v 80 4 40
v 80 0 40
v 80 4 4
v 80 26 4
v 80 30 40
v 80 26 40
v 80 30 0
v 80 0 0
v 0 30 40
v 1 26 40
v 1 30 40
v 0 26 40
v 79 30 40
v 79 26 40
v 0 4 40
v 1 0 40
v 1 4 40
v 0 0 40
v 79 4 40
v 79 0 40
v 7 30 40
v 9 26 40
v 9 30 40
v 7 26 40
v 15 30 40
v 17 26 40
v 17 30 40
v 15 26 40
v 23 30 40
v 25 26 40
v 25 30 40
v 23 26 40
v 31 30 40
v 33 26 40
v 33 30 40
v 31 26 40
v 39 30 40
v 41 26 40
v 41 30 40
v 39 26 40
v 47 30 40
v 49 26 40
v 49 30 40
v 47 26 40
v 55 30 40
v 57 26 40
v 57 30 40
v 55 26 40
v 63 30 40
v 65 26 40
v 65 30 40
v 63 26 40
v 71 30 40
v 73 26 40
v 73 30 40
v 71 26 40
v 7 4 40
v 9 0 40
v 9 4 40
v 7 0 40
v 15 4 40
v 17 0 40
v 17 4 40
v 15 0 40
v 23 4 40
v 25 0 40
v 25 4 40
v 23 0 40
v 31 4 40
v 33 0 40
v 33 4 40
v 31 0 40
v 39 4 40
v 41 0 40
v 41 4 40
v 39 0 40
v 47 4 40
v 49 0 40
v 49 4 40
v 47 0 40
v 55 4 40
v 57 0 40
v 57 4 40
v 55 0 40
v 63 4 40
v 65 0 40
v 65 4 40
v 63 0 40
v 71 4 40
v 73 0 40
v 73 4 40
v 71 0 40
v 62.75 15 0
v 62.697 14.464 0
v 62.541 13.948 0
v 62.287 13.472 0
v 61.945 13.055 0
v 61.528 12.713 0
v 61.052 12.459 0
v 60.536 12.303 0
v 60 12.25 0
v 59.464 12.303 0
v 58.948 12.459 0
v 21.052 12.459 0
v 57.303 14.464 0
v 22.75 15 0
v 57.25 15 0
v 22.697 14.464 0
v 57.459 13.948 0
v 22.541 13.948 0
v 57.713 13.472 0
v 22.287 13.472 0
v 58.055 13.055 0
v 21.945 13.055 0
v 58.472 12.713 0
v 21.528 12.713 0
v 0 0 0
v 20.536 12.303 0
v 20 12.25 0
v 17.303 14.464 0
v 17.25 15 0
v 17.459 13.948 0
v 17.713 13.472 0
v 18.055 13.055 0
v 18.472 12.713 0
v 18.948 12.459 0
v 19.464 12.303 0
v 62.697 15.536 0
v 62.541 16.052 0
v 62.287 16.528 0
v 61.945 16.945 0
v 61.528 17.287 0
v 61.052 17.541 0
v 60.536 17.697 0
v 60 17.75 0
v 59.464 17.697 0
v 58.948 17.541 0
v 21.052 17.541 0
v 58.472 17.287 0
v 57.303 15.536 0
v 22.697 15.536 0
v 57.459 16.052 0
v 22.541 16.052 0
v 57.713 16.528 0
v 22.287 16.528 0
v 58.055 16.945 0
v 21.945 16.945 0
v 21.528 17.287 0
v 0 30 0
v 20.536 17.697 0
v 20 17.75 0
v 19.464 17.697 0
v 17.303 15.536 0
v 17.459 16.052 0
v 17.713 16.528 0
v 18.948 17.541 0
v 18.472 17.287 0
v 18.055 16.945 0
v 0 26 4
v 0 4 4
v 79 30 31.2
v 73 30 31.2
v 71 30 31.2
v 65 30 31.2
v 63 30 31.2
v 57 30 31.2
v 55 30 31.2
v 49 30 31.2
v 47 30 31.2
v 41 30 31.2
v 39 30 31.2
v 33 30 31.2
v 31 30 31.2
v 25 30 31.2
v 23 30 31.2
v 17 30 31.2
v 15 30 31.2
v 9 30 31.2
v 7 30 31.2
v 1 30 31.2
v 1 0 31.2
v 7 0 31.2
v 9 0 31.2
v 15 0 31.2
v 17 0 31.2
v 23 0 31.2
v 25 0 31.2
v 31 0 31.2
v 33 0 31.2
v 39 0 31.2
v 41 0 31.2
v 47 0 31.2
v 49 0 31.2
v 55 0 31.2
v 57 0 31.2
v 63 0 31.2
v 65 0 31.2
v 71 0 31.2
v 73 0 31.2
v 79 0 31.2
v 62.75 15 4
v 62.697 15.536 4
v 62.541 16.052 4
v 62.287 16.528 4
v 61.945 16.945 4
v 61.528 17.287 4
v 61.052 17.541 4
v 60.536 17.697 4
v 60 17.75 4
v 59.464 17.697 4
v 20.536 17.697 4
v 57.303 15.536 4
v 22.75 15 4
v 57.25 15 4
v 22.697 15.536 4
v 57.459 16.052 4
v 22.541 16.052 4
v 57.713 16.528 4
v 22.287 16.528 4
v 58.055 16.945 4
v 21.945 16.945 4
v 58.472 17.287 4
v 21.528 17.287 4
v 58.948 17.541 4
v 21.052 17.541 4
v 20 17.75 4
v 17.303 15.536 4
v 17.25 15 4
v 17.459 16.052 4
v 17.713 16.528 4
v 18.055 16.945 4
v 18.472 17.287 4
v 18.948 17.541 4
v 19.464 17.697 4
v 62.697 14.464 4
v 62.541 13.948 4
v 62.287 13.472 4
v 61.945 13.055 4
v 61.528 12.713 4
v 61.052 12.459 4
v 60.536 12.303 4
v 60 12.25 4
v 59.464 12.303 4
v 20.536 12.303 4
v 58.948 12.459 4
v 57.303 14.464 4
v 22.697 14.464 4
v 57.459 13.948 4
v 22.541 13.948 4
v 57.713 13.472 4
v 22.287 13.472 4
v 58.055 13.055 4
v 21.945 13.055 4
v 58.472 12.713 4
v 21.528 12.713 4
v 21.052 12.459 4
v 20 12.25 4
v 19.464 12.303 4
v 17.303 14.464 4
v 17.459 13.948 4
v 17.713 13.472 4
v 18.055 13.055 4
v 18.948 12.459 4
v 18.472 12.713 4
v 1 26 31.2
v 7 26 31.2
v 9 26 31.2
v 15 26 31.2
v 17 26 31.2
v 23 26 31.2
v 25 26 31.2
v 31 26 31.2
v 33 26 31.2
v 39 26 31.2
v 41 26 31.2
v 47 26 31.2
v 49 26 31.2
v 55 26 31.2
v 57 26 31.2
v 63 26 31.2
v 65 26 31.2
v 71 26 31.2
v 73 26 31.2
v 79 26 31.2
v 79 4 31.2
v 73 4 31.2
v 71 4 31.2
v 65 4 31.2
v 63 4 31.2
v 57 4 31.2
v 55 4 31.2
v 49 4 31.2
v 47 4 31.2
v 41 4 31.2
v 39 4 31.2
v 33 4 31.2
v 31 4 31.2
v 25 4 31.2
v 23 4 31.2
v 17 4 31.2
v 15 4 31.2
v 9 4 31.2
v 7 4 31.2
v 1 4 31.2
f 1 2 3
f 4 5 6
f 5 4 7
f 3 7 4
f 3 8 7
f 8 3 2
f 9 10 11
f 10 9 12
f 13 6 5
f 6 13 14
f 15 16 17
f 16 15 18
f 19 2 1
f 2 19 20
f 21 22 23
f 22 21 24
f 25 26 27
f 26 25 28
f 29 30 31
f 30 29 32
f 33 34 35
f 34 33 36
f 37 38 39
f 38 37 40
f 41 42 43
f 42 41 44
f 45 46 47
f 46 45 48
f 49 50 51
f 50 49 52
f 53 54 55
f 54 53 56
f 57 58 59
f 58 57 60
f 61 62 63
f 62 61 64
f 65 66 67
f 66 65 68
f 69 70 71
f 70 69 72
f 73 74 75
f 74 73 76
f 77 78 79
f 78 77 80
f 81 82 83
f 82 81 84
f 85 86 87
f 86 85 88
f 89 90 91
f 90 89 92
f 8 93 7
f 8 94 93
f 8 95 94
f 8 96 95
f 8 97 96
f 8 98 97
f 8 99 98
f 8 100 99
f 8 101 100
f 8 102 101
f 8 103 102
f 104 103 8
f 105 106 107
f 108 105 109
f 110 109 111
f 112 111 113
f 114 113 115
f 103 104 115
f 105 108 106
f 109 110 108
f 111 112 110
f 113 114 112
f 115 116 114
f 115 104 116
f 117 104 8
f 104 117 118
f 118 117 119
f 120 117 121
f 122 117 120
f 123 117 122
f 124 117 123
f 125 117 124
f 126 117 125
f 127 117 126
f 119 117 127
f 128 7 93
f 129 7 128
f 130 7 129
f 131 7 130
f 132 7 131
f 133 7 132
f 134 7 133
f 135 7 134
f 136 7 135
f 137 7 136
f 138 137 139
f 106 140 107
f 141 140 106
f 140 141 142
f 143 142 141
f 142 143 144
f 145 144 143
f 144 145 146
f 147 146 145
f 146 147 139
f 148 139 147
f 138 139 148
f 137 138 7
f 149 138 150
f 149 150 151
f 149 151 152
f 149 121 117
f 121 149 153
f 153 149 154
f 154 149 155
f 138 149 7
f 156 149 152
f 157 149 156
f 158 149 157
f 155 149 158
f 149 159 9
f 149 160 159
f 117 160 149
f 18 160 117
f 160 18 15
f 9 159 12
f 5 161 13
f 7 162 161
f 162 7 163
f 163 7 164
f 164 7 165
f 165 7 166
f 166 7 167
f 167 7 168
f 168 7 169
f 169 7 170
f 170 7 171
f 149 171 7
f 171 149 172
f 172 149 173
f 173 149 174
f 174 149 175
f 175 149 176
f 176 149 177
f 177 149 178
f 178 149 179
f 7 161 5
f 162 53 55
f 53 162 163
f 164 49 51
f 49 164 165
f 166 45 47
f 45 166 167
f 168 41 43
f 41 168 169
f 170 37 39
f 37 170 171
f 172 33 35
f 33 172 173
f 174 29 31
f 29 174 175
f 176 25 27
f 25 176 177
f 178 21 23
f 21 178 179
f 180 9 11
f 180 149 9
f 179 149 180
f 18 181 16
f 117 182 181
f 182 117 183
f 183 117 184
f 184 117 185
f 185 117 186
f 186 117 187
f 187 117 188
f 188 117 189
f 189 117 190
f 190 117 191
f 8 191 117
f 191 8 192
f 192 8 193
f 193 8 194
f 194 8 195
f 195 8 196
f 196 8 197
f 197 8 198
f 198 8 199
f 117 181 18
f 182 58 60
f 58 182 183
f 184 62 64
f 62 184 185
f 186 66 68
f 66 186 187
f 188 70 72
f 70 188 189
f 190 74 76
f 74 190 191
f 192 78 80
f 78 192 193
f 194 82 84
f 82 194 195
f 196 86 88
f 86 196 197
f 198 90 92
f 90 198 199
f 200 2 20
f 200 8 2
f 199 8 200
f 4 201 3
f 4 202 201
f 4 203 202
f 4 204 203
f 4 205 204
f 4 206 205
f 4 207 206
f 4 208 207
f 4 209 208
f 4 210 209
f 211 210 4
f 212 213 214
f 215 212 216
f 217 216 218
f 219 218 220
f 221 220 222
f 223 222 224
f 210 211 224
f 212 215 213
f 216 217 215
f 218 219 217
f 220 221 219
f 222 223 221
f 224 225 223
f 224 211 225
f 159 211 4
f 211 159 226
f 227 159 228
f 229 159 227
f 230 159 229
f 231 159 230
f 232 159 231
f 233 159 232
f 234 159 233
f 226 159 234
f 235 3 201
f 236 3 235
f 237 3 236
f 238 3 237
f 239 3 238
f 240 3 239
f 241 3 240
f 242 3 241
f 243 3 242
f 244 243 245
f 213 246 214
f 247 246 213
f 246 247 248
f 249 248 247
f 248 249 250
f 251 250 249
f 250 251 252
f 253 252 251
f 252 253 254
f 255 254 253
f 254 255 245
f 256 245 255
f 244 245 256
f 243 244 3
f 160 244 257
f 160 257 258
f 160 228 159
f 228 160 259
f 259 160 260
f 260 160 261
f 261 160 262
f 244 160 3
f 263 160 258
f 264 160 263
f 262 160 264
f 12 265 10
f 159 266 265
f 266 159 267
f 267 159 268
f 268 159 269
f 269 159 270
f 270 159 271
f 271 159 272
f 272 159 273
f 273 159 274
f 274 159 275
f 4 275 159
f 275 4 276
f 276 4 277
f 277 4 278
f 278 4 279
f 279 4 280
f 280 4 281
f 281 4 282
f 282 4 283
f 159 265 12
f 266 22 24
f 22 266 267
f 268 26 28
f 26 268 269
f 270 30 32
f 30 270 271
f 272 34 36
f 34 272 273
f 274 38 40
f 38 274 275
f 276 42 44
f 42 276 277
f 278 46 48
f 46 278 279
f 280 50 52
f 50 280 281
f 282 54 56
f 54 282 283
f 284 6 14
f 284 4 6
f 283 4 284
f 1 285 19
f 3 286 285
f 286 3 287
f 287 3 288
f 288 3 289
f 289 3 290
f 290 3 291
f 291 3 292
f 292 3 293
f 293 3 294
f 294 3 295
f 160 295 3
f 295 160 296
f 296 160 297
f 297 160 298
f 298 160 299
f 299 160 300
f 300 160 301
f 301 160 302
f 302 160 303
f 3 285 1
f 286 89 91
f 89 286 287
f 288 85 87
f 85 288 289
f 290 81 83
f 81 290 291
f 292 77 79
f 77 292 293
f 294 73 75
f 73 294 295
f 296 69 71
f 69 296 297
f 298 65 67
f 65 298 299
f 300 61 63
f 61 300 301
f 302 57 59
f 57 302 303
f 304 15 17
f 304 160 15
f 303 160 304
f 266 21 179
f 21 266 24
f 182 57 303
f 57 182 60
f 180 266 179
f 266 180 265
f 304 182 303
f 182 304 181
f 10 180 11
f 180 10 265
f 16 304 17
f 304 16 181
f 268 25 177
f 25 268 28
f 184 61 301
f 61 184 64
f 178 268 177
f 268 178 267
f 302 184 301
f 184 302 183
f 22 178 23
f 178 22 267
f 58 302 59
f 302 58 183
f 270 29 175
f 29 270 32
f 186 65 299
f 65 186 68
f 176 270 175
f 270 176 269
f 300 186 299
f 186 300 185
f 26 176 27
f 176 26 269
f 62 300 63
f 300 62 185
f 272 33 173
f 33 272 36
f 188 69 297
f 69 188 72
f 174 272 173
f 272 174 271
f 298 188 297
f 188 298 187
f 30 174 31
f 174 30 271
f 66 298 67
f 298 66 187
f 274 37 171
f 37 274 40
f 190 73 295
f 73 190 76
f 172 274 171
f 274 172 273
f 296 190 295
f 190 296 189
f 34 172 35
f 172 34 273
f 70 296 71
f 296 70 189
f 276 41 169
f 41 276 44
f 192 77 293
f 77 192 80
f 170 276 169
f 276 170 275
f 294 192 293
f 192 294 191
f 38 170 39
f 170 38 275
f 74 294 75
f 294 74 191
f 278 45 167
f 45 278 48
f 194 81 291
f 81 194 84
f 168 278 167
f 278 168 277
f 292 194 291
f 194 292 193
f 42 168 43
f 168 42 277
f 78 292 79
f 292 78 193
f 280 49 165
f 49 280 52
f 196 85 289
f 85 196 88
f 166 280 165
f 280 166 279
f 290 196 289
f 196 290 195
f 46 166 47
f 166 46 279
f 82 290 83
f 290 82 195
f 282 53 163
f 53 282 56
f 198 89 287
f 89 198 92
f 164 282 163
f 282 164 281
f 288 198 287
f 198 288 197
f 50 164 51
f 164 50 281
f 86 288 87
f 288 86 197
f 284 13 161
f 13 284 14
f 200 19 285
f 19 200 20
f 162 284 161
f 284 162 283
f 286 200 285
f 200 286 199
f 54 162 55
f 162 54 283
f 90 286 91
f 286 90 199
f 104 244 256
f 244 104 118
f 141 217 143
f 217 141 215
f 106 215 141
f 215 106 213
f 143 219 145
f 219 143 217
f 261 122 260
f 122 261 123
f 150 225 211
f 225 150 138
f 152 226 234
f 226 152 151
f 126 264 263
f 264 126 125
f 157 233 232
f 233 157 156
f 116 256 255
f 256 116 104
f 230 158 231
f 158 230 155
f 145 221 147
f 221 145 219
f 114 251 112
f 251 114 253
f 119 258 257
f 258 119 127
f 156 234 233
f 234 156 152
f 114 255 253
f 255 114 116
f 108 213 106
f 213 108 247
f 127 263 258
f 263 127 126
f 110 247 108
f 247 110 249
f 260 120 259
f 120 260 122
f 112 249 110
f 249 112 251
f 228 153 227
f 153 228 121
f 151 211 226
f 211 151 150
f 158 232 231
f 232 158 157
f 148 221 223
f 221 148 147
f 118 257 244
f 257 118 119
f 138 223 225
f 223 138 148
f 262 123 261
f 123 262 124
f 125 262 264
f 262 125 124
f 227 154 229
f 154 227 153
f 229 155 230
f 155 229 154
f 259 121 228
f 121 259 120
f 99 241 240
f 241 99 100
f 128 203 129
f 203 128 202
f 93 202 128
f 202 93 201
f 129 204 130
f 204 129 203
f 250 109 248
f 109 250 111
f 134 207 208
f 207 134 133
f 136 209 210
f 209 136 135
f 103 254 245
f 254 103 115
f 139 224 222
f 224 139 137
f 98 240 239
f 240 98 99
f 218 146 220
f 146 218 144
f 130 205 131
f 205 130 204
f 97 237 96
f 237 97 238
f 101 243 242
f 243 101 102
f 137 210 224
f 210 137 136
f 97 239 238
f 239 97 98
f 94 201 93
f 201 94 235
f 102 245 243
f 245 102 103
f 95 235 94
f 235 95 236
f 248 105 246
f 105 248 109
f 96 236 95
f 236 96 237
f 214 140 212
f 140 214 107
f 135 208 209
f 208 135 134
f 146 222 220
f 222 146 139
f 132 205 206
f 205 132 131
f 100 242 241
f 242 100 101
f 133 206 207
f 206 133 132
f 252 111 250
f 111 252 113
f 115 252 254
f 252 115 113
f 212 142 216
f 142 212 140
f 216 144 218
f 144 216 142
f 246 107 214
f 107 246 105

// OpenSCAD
$fn = 32;

// ----------------------------------------------------------------------
// Cable duct: 80 x 30 x 40 mm, 10 fingers
// ----------------------------------------------------------------------

// --- parameters (mm) ---
tray_len = 80;            // duct length, X
tray_w = 30;              // duct width, Y
tray_h = 40;              // duct height, Z
tray_t = 4;               // side wall thickness
floor_t = 4;              // floor thickness
slot_w = 6;               // finger slot width
slot_h = 27.2;            // finger slot height
fingers = 10;             // number of finger slots per side
pitch = 8;                // finger pitch
hole_d = 5.5;             // floor mounting hole
hole_n = 2;               // mounting holes in the floor

module shell() {
  difference() {
    cube([tray_len, tray_w, tray_h]);
    /* open top channel */
    translate([-tray_t - 1, tray_t, floor_t])
      cube([tray_len + 2 * tray_t + 2, tray_w - 2 * tray_t, tray_h + 1]);
  }
}

difference() {
  union() {
    shell();
  }
  /* finger slots cut through both side walls */
  for (i = [0 : fingers - 1]) translate([pitch / 2 + i * pitch - slot_w / 2, -1, floor_t + slot_h]) cube([slot_w, tray_w + 2, tray_h]);
  for (i = [0 : hole_n - 1]) translate([(tray_len / hole_n) * (i + 0.5), tray_w / 2, -1]) cylinder(h = floor_t + 2, d = hole_d);
}
